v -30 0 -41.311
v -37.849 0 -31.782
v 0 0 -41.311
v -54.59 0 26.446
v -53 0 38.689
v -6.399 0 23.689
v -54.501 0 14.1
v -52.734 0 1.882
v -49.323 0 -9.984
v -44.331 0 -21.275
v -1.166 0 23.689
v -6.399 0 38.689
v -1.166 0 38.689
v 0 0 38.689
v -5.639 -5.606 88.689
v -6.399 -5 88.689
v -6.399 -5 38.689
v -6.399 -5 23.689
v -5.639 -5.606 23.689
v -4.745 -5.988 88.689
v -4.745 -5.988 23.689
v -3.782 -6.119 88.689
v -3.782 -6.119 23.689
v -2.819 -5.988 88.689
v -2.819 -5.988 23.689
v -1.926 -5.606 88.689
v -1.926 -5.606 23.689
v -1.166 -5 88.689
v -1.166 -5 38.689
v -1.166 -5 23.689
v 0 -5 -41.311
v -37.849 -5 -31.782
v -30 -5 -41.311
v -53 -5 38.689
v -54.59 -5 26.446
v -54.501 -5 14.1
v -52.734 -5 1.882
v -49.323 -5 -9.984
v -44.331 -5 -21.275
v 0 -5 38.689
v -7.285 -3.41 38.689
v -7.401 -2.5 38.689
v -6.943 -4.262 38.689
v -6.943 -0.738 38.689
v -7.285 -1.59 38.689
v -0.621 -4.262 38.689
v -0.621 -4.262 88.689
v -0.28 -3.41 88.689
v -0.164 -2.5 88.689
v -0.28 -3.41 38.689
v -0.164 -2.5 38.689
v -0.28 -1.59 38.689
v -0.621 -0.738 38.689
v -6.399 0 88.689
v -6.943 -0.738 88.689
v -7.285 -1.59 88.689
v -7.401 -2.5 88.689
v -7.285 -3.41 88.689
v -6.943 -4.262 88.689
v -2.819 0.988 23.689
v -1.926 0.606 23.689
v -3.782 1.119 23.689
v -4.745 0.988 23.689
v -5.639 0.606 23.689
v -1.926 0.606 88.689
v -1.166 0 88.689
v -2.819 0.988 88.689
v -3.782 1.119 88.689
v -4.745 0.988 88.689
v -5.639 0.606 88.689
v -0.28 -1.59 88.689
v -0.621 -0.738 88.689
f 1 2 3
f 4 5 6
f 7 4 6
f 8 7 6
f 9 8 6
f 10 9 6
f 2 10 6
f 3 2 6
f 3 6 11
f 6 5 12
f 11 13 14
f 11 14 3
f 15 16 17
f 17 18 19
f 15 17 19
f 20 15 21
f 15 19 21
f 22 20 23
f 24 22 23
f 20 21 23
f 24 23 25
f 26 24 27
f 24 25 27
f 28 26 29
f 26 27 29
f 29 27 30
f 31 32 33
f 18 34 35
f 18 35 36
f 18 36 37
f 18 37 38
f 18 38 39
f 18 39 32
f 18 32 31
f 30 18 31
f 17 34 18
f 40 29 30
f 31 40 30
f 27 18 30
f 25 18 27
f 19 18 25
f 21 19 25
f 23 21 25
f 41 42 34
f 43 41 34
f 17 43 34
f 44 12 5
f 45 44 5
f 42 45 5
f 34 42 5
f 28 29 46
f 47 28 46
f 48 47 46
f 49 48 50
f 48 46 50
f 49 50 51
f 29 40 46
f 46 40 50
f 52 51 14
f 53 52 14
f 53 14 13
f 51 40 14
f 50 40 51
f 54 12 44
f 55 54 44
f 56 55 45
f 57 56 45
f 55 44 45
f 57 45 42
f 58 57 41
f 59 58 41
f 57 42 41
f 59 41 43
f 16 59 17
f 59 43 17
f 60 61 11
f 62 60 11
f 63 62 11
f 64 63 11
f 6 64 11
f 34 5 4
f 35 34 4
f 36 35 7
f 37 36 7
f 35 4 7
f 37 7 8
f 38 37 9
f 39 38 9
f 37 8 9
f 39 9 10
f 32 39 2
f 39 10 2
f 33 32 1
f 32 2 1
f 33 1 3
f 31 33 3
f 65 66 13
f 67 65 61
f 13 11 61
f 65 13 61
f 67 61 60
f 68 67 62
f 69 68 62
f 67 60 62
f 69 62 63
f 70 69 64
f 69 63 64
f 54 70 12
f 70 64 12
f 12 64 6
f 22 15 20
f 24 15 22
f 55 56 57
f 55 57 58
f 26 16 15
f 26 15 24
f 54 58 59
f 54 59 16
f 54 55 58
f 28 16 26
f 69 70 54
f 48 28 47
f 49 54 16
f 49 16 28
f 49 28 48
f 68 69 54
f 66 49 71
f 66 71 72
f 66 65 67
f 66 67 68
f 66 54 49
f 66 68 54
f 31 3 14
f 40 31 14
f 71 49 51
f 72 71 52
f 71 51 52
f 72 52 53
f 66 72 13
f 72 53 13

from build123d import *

# Parameters (mm, degrees)
F1_DEPTH = 5
F3_DEPTH = 15
F4_DEPTH = 50


with BuildPart() as f1:
    # F0 (on Front) → F1 (new body)
    with BuildSketch(Plane.XZ):
        with BuildLine():
            Line((0, -41.3114728638), (0, 38.6885271362))
            Line((0, 38.6885271362), (-53, 38.6885271362))
            ThreePointArc((-53, 38.6885271362), (-51.2309986969, -4.1091349892), (-30, -41.3114728638))
            Line((-30, -41.3114728638), (0, -41.3114728638))
        make_face()
    extrude(amount=F1_DEPTH)

    # F2 (on face) → F3 (join)
    with BuildSketch(Plane.XY.offset(38.6885271362)):
        with BuildLine():
            Line((-6.3985955209, 0), (-1.165957073, 0))
            ThreePointArc((-1.165957073, 0), (-3.782276297, 1.118718873), (-6.3985955209, 0))
        make_face()
        with BuildLine():
            ThreePointArc((-6.3985955209, -5), (-3.782276297, -6.118718873), (-1.165957073, -5))
            Line((-1.165957073, -5), (-6.3985955209, -5))
        make_face()
    extrude(amount=-F3_DEPTH)

    # F2 (on face) → F4 (join)
    with BuildSketch(Plane.XY.offset(38.6885271362)):
        with BuildLine():
            ThreePointArc((-1.165957073, -5), (-0.4234930325, -3.8467372662), (-0.163557424, -2.5))
            ThreePointArc((-0.163557424, -2.5), (-0.4234930325, -1.1532627338), (-1.165957073, 0))
            Line((-1.165957073, 0), (-6.3985955209, 0))
            ThreePointArc((-6.3985955209, 0), (-7.40099517, -2.5), (-6.3985955209, -5))
            Line((-6.3985955209, -5), (-1.165957073, -5))
        make_face()
        with BuildLine():
            Line((-6.3985955209, 0), (-1.165957073, 0))
            ThreePointArc((-1.165957073, 0), (-3.782276297, 1.118718873), (-6.3985955209, 0))
        make_face()
        with BuildLine():
            ThreePointArc((-6.3985955209, -5), (-3.782276297, -6.118718873), (-1.165957073, -5))
            Line((-1.165957073, -5), (-6.3985955209, -5))
        make_face()
    extrude(amount=F4_DEPTH)


solid = f1.part
